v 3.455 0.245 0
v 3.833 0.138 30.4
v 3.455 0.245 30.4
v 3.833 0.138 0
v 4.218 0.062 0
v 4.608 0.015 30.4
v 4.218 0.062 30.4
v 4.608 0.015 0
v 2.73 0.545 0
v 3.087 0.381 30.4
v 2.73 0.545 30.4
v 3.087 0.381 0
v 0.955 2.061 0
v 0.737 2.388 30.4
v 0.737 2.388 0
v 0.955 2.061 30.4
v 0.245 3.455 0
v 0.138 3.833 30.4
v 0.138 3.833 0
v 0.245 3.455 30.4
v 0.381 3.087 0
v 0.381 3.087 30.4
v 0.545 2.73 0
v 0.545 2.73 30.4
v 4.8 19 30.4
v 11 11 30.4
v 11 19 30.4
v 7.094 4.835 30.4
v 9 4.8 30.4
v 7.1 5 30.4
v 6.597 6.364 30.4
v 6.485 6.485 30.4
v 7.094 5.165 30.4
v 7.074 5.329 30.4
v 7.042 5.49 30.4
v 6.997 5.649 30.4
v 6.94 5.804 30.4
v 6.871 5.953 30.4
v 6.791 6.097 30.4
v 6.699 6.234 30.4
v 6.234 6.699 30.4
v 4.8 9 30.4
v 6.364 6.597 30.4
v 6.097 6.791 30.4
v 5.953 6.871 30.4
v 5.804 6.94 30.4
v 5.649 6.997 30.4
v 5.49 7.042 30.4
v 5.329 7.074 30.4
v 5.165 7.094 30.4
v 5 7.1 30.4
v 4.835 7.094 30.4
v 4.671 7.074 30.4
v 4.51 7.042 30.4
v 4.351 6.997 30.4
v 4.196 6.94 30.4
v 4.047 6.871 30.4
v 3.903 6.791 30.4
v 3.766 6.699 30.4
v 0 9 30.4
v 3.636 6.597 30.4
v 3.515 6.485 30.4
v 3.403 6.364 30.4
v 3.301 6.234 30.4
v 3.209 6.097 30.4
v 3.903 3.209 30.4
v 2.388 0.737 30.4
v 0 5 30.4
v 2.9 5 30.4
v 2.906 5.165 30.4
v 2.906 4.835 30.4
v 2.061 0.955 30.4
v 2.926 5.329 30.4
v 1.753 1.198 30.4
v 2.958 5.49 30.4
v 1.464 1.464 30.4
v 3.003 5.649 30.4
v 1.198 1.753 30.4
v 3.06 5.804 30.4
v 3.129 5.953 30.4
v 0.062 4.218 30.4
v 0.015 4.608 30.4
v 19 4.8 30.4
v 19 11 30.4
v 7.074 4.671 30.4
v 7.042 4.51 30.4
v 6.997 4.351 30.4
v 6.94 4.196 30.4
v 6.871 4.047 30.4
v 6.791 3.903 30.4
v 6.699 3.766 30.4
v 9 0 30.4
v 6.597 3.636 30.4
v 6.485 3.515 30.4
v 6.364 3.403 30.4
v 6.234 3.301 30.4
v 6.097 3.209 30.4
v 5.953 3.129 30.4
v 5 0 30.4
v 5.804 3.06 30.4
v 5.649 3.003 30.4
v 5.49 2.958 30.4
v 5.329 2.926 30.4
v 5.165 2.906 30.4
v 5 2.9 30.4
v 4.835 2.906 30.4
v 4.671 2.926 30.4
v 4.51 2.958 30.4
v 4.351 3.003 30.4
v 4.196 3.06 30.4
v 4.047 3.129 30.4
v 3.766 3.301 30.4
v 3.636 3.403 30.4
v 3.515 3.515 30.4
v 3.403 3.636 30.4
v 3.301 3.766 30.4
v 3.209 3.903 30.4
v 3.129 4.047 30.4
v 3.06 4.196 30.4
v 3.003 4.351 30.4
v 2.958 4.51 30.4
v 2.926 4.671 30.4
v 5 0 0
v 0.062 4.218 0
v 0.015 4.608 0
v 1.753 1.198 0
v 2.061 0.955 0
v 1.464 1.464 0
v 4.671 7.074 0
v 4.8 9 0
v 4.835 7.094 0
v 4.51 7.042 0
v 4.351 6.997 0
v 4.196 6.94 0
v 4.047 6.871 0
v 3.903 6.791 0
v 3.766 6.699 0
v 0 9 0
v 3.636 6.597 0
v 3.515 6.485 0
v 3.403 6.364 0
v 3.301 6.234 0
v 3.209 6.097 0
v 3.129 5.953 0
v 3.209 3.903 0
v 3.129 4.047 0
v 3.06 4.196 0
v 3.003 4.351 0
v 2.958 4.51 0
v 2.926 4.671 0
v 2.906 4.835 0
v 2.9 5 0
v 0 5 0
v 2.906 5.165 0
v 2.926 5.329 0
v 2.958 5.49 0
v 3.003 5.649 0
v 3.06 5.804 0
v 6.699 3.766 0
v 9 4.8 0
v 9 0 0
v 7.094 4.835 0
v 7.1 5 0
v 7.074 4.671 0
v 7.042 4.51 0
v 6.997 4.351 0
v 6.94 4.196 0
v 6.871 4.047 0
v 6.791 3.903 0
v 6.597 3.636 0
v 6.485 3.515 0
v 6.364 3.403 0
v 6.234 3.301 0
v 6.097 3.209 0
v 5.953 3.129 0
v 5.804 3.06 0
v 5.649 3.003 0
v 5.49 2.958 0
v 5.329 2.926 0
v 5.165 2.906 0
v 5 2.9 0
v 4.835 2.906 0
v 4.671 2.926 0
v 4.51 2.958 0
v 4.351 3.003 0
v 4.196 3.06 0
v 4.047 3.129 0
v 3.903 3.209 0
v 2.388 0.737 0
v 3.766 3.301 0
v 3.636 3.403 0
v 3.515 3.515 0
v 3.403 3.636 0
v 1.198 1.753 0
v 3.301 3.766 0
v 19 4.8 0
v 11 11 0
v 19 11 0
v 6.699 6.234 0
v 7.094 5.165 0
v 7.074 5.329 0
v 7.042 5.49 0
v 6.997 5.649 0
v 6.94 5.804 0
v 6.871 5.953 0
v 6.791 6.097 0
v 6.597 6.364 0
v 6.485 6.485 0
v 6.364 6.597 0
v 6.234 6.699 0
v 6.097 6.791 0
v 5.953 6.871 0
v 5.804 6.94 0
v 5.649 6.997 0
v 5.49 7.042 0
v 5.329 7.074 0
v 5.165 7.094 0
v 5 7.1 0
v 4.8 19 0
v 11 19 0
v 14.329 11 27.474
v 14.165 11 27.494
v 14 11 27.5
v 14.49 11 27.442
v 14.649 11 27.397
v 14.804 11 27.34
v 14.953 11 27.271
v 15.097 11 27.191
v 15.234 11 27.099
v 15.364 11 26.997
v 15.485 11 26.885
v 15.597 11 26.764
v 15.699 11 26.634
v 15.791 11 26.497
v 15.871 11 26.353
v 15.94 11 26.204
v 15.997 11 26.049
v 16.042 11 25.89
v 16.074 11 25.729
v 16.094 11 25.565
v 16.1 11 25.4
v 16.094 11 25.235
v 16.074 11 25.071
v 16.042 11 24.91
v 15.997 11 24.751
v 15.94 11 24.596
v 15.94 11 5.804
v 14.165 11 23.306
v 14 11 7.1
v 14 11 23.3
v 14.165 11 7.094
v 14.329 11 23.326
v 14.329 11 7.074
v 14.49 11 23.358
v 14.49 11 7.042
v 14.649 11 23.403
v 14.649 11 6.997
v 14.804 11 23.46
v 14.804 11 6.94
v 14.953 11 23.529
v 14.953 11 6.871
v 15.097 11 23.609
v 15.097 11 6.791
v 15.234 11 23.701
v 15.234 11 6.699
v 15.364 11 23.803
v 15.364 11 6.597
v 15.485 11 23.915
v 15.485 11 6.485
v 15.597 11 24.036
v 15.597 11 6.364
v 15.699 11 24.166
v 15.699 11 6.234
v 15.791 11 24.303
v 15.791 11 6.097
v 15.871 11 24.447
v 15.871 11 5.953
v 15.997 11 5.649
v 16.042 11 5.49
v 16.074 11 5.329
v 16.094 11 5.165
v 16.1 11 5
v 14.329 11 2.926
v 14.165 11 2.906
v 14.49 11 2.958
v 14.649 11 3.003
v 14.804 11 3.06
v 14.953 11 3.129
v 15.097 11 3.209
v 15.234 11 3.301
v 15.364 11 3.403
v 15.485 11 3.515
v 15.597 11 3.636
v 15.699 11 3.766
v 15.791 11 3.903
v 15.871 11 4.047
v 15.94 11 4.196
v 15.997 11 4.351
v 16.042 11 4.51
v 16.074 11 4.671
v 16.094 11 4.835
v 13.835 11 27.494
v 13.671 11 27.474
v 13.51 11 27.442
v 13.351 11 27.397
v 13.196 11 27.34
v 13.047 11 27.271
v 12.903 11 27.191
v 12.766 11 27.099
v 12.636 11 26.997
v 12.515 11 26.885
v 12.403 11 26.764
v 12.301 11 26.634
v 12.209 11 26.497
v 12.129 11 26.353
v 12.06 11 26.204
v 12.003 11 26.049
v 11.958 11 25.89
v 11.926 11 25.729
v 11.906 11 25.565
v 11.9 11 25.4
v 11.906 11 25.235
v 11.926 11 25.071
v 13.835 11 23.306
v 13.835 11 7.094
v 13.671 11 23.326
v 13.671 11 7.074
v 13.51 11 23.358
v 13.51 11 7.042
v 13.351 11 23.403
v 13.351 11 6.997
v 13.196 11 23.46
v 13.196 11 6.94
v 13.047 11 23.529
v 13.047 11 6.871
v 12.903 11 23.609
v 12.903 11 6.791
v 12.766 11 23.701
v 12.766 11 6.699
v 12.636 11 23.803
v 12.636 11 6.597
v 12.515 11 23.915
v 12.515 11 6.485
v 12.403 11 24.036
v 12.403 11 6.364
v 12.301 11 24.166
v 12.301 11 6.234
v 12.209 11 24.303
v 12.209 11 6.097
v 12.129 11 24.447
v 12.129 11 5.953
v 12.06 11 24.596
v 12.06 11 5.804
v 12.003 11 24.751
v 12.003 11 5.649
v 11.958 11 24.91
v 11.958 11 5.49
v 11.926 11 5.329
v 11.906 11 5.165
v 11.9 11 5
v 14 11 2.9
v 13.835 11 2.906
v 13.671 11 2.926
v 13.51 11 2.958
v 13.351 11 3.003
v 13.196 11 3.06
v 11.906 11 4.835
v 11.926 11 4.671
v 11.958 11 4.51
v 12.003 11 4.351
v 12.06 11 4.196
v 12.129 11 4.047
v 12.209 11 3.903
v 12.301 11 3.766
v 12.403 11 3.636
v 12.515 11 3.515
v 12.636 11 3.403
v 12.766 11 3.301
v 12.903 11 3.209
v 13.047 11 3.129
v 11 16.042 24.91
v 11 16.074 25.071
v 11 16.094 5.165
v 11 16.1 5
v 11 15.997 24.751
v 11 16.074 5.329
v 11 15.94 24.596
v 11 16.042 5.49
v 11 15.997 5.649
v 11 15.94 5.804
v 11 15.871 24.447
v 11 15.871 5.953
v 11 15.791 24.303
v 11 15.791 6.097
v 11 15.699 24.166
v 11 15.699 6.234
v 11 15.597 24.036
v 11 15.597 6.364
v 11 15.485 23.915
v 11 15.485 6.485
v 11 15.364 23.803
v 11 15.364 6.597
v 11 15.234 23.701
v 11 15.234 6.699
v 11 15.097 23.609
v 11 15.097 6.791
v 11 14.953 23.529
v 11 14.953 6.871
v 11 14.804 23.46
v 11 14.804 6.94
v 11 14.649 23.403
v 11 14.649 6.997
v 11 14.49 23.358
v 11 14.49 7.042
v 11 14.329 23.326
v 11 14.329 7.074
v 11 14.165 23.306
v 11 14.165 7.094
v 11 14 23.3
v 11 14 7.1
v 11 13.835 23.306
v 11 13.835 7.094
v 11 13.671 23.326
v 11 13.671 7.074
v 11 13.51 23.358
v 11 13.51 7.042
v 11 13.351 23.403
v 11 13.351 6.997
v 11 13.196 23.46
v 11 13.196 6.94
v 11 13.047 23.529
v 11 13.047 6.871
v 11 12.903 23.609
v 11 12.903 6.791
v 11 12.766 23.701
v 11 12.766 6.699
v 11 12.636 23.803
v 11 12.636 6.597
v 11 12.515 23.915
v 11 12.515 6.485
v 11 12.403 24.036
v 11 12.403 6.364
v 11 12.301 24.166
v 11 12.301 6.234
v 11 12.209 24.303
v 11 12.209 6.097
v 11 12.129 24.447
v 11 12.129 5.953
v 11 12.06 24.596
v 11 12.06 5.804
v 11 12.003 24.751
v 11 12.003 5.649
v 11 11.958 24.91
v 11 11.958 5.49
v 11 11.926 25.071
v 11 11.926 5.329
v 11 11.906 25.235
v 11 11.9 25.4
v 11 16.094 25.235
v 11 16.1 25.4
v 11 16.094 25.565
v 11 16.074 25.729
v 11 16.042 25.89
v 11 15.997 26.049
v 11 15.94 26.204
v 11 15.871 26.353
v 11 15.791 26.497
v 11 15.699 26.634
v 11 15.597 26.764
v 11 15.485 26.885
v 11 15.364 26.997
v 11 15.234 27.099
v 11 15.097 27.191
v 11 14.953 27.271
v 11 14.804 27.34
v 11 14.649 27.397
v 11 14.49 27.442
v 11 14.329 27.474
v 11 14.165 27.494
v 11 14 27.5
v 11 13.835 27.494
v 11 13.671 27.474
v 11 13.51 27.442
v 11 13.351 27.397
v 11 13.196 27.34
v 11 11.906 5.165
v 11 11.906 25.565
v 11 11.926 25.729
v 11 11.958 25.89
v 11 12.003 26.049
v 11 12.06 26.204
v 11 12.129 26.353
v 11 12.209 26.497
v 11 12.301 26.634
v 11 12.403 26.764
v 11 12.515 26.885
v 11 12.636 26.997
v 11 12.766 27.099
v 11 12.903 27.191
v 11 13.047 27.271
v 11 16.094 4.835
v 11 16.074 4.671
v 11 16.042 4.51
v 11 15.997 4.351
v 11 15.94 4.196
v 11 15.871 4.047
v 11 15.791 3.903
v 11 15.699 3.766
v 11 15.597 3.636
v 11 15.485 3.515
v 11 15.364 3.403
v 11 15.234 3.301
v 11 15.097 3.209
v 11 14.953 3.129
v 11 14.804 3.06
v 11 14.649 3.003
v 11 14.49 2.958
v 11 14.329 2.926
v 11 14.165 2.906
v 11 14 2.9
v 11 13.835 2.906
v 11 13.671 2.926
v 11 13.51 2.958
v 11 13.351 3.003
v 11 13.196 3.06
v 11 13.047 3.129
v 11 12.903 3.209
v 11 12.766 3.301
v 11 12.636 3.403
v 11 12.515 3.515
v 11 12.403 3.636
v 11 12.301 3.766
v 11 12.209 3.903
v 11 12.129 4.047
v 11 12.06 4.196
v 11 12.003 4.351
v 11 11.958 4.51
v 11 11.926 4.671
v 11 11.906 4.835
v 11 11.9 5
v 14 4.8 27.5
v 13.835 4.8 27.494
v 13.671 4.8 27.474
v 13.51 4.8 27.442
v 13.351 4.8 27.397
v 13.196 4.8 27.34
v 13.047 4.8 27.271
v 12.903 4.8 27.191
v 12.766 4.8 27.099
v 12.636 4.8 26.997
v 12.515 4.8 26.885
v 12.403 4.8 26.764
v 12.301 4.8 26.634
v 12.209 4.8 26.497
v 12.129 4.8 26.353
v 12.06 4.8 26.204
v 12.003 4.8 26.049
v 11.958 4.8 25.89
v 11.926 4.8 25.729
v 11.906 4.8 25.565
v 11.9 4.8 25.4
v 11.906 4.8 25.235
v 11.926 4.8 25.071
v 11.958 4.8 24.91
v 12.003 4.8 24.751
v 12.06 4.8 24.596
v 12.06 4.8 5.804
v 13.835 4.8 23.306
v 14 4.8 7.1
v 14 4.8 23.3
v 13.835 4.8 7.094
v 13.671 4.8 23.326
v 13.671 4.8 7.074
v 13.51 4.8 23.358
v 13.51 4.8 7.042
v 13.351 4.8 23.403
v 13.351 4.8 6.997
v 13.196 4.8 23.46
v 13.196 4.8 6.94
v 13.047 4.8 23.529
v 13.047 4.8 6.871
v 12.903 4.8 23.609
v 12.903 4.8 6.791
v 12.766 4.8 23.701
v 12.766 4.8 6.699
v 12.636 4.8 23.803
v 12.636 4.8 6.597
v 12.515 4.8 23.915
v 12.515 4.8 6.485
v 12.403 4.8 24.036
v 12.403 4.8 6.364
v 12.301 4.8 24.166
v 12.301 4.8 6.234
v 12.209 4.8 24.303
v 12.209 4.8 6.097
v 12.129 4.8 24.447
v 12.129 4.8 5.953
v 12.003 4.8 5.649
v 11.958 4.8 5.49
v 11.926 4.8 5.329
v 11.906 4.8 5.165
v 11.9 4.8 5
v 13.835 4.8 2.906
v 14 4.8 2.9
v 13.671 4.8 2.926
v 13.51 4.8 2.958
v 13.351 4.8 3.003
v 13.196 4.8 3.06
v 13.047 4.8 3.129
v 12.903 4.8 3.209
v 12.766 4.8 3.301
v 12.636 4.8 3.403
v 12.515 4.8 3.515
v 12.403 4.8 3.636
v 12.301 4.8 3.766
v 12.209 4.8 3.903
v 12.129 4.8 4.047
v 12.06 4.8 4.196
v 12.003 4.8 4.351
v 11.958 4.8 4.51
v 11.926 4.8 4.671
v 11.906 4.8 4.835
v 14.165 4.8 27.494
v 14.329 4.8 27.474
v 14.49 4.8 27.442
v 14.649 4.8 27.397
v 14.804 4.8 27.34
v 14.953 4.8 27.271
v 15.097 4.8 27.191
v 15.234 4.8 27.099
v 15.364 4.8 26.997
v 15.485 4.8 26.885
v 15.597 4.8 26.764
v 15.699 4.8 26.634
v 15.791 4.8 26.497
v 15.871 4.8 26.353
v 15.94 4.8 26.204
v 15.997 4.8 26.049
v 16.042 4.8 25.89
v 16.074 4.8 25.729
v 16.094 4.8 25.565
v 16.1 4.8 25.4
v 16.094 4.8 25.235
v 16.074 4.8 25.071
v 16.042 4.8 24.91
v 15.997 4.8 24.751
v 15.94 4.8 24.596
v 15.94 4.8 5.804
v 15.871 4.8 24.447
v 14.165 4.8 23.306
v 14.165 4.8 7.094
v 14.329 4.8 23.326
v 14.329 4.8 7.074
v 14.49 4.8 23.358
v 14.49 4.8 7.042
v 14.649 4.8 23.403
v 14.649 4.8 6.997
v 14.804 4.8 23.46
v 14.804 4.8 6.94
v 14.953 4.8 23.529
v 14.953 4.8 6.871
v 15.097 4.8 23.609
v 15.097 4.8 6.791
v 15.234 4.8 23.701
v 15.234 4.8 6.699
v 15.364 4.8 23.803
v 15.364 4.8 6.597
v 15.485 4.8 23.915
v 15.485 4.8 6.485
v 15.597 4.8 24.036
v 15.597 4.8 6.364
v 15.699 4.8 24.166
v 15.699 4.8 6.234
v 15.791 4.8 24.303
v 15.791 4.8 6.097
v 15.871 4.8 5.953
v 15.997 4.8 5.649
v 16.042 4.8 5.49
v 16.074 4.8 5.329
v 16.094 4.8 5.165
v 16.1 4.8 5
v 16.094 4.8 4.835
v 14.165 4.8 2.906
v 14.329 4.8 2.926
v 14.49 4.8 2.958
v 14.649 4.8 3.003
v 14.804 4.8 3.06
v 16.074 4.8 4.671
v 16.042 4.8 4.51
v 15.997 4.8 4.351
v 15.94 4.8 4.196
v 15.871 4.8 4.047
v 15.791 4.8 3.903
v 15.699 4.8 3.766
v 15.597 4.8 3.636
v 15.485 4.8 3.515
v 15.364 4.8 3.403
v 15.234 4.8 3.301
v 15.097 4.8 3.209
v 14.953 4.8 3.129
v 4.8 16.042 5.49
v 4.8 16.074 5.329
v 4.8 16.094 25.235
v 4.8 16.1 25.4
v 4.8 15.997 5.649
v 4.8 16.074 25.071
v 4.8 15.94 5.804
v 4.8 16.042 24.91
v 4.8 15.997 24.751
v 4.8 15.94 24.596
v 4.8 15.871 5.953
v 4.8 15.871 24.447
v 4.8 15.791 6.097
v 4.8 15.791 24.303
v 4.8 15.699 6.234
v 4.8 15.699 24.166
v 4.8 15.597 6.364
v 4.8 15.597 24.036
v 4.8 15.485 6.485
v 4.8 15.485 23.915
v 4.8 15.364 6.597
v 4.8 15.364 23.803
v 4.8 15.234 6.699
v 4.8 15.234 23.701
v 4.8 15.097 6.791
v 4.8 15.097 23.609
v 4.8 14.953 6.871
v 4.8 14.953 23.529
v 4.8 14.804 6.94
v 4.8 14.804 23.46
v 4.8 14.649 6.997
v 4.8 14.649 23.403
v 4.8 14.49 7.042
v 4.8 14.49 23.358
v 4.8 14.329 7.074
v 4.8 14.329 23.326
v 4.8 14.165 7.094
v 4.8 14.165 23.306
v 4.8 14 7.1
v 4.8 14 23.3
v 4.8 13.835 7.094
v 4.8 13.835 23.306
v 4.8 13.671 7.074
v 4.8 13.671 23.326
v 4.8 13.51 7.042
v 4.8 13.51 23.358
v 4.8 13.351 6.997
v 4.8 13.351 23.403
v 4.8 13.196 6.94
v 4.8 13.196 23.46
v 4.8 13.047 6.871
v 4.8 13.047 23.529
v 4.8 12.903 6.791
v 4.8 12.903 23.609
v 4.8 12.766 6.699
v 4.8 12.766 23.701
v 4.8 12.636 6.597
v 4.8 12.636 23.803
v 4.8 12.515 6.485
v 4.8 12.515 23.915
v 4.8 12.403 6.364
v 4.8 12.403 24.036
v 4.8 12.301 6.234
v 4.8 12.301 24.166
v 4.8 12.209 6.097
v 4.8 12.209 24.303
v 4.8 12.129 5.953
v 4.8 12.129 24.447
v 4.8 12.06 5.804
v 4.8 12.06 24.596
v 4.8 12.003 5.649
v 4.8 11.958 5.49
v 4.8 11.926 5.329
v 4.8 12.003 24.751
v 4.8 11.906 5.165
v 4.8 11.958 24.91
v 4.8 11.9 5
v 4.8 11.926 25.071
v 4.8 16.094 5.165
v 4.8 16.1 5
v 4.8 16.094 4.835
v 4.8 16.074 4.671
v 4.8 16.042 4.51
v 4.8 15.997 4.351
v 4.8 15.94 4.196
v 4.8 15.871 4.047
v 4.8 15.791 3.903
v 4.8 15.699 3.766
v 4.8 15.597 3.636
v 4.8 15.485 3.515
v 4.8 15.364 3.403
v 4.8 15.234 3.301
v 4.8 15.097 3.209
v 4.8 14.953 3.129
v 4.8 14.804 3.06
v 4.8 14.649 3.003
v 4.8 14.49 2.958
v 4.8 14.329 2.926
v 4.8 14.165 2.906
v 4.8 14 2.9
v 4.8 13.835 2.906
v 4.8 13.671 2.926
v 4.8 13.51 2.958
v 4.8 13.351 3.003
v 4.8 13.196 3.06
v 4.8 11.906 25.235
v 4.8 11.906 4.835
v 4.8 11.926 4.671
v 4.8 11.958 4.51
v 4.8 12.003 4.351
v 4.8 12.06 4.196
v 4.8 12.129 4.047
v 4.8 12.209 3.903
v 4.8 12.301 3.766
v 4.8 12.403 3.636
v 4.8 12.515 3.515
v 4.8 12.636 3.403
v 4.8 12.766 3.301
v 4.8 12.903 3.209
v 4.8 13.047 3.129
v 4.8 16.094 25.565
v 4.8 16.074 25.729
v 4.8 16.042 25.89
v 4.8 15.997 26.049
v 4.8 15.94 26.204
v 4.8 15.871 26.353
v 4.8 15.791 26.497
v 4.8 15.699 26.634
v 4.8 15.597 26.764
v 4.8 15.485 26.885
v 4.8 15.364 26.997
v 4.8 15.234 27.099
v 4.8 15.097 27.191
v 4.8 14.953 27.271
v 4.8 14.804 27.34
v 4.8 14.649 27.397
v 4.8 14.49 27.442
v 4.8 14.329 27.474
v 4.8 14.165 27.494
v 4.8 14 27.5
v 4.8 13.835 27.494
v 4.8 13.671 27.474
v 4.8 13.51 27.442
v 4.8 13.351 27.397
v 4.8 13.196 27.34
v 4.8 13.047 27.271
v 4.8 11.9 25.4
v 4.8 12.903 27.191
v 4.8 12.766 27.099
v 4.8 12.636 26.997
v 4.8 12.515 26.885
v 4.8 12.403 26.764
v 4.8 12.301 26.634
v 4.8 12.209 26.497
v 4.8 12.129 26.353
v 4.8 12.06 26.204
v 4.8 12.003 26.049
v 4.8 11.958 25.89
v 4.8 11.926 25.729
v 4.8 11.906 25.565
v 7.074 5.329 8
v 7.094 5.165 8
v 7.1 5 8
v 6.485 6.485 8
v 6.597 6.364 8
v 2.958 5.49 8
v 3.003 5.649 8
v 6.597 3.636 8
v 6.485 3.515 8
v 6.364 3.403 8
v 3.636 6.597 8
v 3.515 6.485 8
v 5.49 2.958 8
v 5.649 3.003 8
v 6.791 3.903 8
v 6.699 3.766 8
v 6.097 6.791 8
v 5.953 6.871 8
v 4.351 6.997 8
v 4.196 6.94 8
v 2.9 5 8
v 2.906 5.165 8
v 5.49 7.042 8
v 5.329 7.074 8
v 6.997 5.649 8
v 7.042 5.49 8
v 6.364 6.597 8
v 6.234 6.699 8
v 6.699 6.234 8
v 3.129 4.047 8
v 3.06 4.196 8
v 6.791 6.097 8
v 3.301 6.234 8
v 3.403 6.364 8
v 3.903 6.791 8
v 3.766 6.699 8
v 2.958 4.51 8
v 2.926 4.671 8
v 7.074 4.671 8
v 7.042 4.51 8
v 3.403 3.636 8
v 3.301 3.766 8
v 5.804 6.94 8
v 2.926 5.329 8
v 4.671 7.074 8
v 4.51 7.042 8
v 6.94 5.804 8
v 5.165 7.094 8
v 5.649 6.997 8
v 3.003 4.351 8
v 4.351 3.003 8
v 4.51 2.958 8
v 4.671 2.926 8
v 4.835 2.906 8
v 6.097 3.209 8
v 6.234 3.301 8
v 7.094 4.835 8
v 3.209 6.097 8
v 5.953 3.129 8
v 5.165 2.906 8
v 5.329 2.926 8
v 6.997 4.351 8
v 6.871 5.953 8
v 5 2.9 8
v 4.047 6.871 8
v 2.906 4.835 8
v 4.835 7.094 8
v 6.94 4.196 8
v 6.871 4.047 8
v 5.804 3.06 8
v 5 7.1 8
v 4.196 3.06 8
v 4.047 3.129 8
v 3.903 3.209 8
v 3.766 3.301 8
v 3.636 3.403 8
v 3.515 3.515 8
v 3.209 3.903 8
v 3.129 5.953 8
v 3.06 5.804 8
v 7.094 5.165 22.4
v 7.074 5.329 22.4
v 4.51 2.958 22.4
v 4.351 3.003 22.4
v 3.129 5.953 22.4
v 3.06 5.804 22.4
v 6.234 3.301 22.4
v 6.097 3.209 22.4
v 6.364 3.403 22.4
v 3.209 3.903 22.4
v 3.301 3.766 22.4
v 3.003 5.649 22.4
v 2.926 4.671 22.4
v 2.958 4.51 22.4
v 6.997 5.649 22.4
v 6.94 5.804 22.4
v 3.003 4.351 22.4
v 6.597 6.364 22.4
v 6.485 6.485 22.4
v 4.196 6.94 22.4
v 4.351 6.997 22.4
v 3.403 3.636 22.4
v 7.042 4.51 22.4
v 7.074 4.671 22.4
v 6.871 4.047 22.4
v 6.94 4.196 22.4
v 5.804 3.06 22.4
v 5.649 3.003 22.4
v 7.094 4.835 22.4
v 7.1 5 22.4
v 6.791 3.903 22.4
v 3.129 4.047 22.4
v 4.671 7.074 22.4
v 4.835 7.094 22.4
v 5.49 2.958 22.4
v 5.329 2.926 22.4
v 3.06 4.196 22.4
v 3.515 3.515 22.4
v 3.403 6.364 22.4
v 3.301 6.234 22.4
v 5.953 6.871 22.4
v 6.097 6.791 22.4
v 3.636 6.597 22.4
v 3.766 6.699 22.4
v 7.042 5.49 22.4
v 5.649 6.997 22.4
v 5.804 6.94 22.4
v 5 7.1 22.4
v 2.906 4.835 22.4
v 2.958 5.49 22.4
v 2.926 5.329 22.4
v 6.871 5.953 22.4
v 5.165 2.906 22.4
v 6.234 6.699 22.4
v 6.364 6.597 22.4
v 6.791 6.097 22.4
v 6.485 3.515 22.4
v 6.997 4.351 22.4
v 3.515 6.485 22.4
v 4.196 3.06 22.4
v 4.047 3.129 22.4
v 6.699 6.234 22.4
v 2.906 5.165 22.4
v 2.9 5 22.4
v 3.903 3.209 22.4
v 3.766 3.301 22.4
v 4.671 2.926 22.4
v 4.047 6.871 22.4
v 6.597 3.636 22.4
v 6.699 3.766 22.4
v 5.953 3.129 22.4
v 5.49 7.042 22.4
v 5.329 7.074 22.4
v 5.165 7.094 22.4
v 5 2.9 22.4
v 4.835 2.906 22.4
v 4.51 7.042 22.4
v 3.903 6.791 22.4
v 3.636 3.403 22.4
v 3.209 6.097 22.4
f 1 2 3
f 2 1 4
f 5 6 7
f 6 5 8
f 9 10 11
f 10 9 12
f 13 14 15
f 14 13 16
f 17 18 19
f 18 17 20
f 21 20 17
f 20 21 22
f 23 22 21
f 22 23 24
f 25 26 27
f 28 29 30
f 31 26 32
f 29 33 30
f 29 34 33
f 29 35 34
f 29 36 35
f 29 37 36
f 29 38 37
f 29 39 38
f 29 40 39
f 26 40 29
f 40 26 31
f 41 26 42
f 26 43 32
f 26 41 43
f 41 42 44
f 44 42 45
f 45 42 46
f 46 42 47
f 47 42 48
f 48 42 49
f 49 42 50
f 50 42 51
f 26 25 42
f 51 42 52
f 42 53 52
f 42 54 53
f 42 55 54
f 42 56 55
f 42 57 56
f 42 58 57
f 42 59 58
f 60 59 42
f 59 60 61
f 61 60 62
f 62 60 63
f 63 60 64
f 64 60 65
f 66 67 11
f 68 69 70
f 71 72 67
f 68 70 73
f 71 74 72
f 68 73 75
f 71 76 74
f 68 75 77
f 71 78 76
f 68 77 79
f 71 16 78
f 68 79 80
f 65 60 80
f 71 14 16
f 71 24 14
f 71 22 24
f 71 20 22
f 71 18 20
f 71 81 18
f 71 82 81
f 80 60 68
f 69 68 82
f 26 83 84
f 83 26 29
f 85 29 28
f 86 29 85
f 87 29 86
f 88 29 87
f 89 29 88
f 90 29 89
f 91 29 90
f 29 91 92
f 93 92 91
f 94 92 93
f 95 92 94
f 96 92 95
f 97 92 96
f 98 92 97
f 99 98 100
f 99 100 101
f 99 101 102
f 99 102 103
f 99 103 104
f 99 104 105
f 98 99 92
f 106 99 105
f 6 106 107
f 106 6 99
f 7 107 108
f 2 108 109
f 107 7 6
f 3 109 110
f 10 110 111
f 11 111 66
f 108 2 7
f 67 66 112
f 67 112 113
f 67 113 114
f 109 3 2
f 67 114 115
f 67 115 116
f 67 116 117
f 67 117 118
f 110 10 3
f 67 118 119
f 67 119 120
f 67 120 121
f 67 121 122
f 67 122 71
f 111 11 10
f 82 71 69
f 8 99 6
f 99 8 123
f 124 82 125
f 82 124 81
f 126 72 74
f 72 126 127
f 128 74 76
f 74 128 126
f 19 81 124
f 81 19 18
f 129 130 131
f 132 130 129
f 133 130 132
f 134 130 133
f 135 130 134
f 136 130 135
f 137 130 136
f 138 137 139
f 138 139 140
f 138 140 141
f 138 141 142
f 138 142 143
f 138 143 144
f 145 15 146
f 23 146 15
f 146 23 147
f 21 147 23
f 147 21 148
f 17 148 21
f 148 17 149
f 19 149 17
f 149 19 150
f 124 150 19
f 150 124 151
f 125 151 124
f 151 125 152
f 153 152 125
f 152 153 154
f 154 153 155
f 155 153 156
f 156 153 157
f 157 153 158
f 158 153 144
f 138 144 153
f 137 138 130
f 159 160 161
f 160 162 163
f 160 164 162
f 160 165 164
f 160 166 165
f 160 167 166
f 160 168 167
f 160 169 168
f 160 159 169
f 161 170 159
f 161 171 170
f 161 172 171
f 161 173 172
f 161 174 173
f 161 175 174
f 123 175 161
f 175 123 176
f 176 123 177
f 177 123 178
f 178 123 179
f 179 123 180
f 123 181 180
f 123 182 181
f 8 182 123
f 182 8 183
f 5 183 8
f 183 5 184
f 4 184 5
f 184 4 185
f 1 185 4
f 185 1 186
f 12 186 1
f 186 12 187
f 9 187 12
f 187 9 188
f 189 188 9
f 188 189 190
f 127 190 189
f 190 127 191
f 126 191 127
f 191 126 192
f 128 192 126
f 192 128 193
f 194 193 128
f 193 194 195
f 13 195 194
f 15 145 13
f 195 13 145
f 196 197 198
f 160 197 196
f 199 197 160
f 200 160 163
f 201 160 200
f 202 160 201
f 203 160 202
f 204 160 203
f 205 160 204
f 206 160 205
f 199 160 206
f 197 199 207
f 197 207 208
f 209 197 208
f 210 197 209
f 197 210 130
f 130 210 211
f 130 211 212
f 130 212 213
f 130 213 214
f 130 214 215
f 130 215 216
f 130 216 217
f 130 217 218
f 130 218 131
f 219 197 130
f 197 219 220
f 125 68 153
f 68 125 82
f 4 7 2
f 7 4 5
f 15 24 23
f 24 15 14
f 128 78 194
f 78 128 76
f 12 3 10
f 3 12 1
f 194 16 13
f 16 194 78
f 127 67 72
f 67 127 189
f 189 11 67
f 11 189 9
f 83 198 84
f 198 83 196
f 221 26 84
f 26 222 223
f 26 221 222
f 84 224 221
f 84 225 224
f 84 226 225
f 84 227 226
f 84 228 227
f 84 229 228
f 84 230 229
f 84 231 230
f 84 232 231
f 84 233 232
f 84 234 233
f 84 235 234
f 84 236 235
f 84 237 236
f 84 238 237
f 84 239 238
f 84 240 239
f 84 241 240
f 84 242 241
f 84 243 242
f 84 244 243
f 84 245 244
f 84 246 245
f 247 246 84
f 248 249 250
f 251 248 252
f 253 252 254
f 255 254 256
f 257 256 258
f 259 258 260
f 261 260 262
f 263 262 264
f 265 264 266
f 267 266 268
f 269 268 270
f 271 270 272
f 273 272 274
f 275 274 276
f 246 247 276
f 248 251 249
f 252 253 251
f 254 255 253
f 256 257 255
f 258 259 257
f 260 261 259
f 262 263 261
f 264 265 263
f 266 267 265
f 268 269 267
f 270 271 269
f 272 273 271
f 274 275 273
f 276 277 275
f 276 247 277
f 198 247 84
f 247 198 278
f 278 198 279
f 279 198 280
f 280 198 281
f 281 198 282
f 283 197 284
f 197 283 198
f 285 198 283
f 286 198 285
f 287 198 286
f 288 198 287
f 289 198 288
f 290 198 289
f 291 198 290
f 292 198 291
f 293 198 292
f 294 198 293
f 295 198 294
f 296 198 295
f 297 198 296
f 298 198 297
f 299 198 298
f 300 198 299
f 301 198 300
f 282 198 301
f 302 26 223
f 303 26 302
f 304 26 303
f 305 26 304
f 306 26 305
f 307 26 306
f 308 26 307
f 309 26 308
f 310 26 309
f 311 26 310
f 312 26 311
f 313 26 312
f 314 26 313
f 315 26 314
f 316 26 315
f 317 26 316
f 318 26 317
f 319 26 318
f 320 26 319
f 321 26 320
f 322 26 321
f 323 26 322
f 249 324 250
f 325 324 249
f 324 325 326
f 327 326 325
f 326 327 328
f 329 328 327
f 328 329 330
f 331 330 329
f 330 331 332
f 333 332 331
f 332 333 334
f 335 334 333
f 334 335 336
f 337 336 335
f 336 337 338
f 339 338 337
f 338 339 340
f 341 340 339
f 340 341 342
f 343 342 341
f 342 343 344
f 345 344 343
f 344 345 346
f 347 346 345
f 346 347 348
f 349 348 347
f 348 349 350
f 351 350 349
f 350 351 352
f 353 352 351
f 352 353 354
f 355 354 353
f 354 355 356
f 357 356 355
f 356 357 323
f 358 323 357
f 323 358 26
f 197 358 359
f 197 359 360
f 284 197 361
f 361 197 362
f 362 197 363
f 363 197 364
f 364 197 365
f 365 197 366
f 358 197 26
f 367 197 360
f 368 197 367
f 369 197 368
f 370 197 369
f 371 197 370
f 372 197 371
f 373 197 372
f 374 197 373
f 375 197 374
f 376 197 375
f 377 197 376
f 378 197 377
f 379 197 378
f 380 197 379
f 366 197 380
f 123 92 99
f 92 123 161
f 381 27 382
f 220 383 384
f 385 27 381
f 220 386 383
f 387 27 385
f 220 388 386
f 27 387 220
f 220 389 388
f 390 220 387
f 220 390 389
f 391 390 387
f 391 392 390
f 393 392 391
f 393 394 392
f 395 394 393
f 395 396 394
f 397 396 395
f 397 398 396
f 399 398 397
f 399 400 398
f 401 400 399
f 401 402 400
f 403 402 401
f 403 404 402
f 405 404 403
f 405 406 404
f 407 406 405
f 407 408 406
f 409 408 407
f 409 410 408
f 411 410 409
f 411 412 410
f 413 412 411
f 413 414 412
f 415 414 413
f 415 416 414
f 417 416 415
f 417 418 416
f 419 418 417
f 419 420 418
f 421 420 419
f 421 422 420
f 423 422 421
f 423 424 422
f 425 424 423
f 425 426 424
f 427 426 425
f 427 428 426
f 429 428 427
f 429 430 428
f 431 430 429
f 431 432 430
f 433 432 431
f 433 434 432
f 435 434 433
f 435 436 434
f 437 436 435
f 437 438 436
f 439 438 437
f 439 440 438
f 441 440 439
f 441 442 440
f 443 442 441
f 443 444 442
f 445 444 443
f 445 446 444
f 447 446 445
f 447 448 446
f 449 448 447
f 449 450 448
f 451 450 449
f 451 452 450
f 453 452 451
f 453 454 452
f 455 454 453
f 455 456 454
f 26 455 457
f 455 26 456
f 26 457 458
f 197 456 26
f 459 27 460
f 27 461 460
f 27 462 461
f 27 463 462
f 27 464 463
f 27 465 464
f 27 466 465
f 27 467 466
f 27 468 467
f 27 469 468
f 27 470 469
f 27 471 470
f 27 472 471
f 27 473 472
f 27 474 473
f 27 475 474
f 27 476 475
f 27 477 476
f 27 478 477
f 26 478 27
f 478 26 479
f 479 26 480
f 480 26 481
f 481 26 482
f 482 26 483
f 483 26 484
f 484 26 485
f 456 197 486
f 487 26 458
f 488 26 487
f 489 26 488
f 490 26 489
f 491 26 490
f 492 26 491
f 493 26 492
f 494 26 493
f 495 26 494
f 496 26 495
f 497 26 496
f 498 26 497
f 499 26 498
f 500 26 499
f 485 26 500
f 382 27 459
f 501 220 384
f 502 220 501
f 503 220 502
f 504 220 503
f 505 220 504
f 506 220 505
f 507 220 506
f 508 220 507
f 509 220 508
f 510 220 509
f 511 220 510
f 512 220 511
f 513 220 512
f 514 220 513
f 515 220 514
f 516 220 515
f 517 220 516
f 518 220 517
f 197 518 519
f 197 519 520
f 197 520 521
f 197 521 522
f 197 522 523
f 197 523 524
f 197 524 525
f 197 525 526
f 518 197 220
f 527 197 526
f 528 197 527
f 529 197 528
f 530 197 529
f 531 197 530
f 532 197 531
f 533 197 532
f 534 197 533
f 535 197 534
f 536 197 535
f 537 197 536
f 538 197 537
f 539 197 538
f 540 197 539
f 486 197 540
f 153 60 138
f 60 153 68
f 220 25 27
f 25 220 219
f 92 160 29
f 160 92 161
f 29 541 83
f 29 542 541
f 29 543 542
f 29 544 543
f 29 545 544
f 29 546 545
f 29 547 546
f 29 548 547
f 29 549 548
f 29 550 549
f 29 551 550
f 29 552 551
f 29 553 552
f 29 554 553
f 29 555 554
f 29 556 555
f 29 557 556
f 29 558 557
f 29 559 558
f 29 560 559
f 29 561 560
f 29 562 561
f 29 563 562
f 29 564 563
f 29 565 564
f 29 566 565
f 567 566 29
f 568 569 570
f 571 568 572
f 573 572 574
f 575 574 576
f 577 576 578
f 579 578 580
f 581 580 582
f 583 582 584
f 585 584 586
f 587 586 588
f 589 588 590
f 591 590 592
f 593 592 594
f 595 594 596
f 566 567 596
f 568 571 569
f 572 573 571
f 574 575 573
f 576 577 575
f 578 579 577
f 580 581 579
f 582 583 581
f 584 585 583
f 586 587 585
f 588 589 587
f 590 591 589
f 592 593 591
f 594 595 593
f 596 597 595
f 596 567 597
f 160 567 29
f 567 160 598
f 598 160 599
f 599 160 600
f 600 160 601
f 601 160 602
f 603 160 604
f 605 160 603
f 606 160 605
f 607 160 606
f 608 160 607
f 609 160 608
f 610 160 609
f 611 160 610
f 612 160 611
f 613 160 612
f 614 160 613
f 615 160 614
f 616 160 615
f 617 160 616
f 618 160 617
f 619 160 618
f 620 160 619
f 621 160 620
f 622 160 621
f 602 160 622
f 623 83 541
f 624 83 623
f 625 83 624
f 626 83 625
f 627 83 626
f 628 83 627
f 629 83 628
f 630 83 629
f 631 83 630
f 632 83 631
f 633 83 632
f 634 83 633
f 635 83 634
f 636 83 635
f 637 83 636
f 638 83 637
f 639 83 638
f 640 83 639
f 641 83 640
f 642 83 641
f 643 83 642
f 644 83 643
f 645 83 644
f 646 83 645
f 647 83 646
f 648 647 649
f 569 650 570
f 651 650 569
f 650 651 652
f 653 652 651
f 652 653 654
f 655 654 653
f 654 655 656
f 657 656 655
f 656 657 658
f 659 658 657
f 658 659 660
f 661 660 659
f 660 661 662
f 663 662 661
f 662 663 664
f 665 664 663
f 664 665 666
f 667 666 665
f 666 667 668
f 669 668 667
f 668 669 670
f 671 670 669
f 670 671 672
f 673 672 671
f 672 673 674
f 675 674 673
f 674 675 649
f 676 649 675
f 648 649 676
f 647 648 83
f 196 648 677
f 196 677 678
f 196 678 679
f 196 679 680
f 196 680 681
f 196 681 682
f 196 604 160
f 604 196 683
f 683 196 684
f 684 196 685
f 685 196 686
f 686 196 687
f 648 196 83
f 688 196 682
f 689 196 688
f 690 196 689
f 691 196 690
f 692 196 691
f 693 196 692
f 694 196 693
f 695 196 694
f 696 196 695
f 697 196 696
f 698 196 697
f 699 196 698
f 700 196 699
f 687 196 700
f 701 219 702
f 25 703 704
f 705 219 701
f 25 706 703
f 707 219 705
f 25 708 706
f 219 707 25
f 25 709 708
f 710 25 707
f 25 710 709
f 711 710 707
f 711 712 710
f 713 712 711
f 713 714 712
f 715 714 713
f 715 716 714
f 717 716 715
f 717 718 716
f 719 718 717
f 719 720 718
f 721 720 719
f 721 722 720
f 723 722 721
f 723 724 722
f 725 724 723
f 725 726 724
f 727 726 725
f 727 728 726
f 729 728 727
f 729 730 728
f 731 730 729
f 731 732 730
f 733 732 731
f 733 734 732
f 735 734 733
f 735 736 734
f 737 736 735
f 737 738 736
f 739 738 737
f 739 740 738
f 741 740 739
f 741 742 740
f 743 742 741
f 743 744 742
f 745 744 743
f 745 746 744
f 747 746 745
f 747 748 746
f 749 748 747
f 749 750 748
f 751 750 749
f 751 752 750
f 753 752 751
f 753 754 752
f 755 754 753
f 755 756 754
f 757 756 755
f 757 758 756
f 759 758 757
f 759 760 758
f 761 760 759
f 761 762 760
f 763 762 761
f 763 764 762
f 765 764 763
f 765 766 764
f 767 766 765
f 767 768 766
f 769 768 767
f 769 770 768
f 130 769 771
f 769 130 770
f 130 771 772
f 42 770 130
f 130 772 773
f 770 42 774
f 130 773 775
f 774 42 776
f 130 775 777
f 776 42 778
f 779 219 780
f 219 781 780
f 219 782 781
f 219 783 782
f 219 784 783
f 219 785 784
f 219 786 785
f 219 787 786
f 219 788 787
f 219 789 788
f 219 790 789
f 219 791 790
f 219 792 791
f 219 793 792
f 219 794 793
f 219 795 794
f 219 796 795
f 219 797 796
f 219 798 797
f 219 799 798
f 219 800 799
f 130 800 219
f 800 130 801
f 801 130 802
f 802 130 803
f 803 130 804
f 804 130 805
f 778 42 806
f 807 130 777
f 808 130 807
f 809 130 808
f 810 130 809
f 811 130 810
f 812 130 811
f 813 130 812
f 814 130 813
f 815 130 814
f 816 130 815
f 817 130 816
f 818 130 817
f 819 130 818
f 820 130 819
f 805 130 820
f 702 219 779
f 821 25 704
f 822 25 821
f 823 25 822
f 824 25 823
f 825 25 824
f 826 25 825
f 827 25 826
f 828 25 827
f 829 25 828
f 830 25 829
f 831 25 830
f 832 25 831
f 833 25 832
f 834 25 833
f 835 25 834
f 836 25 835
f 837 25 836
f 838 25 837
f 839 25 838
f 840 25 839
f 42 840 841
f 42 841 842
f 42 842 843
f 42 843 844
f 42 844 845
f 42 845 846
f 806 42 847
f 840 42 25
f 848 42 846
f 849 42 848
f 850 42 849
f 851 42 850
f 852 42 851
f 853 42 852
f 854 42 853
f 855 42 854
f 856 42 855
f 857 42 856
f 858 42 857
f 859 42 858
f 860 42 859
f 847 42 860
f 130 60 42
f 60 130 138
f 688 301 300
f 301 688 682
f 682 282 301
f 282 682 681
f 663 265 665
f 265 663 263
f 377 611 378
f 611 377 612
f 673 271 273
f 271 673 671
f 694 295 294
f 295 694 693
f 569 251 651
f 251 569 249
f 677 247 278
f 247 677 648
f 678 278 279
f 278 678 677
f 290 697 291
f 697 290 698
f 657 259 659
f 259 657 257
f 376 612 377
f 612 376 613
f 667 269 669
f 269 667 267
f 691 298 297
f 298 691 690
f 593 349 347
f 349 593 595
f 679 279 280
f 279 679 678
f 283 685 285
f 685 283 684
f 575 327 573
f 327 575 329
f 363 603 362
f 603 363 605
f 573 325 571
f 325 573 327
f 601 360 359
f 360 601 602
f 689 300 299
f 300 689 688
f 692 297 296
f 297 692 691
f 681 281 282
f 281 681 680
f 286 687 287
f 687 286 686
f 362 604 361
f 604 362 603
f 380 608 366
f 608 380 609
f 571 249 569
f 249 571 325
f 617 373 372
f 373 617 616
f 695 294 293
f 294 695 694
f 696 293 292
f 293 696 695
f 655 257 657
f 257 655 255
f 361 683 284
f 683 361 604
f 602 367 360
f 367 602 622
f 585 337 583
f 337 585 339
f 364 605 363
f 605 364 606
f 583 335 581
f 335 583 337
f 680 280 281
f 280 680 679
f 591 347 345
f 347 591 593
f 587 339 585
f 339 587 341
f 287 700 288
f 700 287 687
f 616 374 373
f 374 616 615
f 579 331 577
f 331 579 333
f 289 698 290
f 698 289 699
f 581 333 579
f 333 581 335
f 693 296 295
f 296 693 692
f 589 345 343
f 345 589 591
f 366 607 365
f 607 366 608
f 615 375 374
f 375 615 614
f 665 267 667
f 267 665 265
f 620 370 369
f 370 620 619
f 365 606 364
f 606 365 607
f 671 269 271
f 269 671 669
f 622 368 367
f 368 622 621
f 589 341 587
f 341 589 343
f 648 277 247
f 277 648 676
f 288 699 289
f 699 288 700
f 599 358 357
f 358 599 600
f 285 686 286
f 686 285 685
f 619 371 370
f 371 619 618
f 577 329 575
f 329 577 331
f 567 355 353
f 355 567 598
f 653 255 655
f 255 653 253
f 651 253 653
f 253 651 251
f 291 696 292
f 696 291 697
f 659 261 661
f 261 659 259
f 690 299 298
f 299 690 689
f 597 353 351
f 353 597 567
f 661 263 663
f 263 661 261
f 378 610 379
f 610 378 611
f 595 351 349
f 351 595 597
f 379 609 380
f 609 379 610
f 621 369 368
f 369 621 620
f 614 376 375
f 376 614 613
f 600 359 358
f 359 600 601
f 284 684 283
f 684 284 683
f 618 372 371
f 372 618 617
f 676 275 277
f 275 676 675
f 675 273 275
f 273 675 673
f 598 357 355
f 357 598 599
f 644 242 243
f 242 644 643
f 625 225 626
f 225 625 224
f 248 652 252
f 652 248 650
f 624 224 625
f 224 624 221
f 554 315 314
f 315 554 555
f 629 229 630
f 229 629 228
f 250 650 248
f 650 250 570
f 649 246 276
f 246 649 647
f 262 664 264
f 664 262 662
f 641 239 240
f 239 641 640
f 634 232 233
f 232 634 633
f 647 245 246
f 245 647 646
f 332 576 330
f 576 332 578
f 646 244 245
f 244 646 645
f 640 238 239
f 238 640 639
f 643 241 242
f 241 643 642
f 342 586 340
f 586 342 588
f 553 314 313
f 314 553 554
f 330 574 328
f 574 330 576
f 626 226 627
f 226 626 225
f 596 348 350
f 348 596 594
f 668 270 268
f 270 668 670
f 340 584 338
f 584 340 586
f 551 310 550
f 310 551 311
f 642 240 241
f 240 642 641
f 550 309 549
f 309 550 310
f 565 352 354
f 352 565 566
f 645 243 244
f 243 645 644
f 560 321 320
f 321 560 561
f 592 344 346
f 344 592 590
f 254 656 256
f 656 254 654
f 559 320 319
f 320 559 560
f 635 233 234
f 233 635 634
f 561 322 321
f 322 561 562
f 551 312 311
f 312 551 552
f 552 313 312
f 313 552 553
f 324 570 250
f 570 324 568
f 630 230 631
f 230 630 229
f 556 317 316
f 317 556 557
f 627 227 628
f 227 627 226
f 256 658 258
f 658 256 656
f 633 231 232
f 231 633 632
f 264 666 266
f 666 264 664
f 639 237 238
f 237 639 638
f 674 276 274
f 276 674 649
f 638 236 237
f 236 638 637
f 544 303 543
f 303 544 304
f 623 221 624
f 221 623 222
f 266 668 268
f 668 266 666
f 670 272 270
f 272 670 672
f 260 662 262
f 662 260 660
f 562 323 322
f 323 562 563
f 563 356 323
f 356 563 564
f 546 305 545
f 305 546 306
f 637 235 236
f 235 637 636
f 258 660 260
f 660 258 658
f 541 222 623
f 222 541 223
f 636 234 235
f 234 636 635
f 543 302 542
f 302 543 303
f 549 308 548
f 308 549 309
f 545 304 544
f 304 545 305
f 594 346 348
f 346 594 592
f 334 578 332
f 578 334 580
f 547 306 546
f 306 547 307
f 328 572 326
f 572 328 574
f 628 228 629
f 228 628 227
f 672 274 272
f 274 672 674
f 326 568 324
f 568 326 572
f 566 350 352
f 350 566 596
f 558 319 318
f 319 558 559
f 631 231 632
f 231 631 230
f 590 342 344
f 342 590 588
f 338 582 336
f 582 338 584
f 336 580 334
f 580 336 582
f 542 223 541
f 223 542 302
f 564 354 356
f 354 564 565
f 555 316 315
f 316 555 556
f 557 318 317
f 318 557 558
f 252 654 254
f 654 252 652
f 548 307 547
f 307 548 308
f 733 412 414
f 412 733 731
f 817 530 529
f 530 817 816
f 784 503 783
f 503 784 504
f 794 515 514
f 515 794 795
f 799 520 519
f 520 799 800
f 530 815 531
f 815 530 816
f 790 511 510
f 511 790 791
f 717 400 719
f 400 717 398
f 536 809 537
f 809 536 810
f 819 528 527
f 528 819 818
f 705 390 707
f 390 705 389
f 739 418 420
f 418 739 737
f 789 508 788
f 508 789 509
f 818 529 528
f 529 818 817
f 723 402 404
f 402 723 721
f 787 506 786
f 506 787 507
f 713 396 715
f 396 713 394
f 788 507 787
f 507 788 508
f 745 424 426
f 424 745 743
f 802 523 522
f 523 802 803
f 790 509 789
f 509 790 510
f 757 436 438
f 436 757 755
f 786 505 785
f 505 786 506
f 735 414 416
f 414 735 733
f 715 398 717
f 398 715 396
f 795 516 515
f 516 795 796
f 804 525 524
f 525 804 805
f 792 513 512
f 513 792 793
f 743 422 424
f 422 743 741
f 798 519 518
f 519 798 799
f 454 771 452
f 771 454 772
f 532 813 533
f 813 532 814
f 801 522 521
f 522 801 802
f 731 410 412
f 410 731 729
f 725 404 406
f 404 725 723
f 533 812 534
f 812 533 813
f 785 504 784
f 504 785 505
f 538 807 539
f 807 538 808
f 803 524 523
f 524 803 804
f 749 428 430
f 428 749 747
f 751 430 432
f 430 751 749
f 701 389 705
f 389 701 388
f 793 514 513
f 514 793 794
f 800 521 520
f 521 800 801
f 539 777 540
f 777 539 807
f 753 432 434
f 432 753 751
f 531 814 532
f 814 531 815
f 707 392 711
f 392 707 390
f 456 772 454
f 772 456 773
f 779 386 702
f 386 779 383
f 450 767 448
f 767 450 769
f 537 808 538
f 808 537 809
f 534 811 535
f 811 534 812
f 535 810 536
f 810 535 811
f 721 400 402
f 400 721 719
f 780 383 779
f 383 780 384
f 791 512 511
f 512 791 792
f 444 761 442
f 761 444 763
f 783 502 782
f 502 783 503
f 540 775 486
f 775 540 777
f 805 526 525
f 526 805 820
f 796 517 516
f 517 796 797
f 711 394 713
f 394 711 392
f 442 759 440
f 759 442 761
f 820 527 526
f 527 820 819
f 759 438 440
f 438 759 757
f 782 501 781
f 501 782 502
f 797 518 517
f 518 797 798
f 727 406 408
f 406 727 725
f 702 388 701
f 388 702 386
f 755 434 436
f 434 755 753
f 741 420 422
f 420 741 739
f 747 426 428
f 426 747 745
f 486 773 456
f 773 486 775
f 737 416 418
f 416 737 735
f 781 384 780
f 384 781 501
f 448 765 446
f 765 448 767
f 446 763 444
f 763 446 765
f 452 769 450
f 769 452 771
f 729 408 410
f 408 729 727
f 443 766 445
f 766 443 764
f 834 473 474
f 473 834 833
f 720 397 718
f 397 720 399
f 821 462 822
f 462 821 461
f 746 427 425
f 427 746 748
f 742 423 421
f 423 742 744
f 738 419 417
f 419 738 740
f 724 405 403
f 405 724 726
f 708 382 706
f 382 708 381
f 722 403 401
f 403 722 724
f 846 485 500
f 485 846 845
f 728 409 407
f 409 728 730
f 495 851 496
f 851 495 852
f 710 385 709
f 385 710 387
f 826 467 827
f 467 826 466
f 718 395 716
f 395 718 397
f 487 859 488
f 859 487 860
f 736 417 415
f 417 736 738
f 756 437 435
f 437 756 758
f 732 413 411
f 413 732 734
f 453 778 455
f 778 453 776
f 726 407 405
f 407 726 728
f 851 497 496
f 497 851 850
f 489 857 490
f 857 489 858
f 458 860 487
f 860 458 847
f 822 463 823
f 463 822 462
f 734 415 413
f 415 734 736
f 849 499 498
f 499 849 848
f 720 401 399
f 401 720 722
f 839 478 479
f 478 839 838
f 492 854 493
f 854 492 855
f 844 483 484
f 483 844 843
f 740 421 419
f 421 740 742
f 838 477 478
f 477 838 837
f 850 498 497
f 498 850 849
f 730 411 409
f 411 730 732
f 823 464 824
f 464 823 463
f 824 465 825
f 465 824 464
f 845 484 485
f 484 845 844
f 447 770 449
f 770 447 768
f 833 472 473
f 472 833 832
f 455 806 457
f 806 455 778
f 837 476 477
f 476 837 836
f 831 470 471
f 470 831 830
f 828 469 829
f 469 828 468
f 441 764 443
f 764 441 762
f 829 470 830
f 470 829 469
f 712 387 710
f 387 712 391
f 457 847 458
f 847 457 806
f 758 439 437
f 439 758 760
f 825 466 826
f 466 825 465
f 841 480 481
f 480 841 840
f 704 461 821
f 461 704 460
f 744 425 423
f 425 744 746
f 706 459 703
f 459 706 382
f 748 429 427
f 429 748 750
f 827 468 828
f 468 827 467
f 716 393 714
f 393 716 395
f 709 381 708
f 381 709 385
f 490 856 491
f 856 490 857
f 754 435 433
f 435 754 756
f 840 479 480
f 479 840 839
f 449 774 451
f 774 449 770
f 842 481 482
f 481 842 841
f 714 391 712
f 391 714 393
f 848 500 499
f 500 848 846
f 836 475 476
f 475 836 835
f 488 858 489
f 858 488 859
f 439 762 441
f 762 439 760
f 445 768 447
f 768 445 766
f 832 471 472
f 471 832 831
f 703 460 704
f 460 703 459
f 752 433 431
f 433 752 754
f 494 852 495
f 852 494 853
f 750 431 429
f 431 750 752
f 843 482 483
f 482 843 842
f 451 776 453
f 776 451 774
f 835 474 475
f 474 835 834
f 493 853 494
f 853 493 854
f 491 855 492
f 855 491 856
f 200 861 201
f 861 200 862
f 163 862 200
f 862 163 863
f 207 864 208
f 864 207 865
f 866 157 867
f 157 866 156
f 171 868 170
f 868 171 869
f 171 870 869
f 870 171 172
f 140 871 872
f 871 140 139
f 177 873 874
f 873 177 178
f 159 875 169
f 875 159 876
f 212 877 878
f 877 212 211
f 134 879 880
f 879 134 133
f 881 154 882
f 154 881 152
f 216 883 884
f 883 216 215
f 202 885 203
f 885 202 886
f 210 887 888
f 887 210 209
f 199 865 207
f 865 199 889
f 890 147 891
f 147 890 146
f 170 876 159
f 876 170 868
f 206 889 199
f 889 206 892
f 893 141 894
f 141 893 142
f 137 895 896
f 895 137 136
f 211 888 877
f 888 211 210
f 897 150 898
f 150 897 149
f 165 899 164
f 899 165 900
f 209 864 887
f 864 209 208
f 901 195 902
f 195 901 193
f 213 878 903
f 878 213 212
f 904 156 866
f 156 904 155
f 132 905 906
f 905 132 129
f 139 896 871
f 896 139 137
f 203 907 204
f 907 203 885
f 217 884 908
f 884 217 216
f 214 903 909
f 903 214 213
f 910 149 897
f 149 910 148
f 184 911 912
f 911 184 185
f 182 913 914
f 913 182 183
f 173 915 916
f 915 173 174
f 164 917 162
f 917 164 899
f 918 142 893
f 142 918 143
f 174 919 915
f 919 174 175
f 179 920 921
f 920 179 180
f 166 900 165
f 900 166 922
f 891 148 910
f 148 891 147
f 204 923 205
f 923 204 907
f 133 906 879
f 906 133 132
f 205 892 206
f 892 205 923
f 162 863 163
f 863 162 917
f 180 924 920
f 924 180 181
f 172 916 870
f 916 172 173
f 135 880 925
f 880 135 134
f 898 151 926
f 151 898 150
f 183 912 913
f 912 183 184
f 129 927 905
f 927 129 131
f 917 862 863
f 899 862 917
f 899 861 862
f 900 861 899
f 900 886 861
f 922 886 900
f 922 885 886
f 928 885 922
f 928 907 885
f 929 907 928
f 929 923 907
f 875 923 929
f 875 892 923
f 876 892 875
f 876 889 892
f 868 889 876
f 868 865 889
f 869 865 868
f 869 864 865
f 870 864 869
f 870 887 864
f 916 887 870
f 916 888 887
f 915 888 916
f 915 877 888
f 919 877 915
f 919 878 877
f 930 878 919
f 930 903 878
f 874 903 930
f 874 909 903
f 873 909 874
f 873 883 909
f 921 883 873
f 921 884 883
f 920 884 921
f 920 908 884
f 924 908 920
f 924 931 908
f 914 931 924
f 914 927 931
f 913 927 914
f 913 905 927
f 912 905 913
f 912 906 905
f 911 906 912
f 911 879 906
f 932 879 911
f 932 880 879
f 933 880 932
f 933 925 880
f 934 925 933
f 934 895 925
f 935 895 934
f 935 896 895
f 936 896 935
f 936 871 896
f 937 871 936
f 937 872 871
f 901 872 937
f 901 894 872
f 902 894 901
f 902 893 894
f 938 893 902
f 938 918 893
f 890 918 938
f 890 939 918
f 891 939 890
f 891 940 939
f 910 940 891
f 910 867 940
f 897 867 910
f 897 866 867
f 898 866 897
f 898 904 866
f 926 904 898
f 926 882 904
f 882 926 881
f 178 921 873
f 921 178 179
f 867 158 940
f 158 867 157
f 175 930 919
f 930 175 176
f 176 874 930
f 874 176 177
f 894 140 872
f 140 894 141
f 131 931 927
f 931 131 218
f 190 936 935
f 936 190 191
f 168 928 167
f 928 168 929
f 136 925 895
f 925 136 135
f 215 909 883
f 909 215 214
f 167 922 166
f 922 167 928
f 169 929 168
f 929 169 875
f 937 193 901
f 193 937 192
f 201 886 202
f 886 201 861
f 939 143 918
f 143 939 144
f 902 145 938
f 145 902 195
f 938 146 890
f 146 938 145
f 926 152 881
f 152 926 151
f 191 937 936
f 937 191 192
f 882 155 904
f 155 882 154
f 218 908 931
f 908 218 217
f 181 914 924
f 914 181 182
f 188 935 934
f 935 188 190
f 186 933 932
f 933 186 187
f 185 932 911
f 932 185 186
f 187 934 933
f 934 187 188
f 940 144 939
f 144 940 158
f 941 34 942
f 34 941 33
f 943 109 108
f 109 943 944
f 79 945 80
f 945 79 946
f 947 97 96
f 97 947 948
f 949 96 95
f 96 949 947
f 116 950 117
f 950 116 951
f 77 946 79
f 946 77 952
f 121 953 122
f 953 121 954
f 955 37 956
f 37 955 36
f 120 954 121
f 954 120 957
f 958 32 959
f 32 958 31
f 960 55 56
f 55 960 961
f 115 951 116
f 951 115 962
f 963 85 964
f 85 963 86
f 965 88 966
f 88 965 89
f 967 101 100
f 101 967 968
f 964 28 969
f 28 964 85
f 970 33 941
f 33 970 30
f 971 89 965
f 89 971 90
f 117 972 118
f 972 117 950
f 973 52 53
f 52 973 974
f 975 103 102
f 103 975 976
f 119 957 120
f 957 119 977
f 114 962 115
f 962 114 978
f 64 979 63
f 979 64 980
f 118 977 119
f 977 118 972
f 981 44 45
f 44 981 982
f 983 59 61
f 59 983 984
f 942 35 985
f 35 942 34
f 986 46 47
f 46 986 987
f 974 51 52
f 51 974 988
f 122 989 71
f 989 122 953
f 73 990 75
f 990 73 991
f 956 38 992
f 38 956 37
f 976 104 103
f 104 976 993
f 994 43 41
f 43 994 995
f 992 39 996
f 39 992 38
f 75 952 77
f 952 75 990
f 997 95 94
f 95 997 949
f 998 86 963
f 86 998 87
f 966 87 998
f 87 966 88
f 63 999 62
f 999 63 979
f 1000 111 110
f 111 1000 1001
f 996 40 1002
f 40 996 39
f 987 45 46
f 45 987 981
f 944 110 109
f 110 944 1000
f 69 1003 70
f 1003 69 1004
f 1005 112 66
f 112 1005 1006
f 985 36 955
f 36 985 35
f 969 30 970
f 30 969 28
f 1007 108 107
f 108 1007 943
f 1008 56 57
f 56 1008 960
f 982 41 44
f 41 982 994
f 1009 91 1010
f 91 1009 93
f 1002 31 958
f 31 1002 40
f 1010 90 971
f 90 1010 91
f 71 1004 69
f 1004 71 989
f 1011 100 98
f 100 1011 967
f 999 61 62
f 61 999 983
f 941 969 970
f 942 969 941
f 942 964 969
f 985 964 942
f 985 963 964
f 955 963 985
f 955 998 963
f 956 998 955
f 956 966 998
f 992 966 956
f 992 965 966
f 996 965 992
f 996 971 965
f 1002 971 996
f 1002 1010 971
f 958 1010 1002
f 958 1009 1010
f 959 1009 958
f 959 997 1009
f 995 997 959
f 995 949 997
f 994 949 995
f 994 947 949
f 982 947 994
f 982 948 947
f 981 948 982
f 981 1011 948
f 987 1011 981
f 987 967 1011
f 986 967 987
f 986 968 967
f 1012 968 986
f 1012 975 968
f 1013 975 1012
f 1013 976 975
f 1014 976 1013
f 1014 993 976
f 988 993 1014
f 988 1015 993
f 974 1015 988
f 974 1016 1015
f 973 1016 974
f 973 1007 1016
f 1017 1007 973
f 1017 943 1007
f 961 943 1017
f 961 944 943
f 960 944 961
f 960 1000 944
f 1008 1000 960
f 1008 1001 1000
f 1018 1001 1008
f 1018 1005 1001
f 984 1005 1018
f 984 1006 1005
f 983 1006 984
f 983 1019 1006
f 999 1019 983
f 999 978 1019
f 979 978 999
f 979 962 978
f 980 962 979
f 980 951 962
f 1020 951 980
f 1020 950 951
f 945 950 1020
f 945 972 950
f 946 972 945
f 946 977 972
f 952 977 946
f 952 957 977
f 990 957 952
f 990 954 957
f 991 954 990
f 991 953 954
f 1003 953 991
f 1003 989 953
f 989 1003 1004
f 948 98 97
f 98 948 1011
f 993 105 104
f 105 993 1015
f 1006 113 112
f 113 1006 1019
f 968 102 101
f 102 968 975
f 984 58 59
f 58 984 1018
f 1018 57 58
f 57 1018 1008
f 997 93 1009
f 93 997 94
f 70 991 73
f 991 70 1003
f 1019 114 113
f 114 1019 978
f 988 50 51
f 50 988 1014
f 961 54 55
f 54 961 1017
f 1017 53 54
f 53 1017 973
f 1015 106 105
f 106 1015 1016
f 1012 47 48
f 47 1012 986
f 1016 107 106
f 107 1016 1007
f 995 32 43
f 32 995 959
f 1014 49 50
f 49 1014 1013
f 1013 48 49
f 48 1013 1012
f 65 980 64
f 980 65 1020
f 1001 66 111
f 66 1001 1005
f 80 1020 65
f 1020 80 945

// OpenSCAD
// file: ../configurations/global.scad
// external size
case_external_x_size = 90;
case_external_y_size = 140;
case_external_z_size = 40;
case_external_panes_thickness = 4.8;

facade_front_round_edges_radius = 5;
facade_throws_margin = 5;

// facade corners
facade_corners_offset_lenght = 9;
facade_corners_main_x_size = 19;
facade_corners_main_y_size = 19;
facade_corners_main_thickness = 11;

facade_fn = 100;


facade_controller_coords = [
    case_external_x_size / 2,
    case_external_y_size / 2 - 30,
];


// Screen frames



// Generics
insert_throw_diameter = 4.2;
insert_throw_length = 6 + 2;


// Controller facade
controller_breadboard_x_size_point = 28;
controller_breadboard_y_size_point = 9;

controller_facade_z_size = 2;
controller_facade_button_throw_margin = 1;

controller_facade_border_rounded_border_1 = 5;
controller_facade_border_rounded_border_2 = 4;

controller_facade_with_border_x_size = 78;
controller_facade_with_border_y_size = 45;

controller_facade_border_throws_margin = 5;
controller_facade_border_fn = 80;


// Cross Button
controller_cross_button_x_y_size = 20;
controller_cross_button_z_size = 4;
controller_cross_button_thickness = 6;
controller_cross_button_round_edges_radius = 1;
controller_cross_button_support_x_y_size = 22;
controller_cross_button_support_z_size = 1;
controller_cross_button_fn = 150;


// A and B Buttons
controller_a_b_button_diameter = 7;
controller_a_b_button_z_size = 4;
controller_a_b_button_support_diameter = 9;
controller_a_b_button_support_z_size = 1;
controller_a_b_button_fn = 80;


// small Buttons
controller_small_button_diameter = 5;
controller_small_button_z_size = 3;
controller_small_button_support_diameter = 7;
controller_small_button_support_z_size = 1;
controller_small_button_fn = 80;

// Directional cross
controller_directional_cross_points_coords = [6, 5];
controller_start_button_points_coords = [14, 3];
controller_select_button_points_coords = [18, 3];
controller_menu_button_points_coords = [14, 7];
controller_option_button_points_coords = [18, 7];
controller_a_button_points_coords = [23, 4];
controller_b_button_points_coords = [27, 6];
controller_bolt_throws_list = [
    [2, 2],
    [2, 8],
    [10, 2],
    [10, 8],
    [27, 2],
    [23, 8],
];
// main file
include <./../configurations/global.scad>


module facadeCornerPiece(
    round_radius = facade_front_round_edges_radius,
    z_size = case_external_z_size - (case_external_panes_thickness * 2),
    main_x_size = facade_corners_main_x_size,
    main_y_size = facade_corners_main_y_size,
    main_thickness = facade_corners_main_thickness,

    x_branch_offset_thickness = case_external_panes_thickness,
    x_branch_offset_lenght = facade_corners_offset_lenght,

    y_branch_offset_thickness = case_external_panes_thickness,
    y_branch_offset_lenght = facade_corners_offset_lenght,

    correction_offset_thickness = 0.0, //
    correction_offset_length = 0.0, //

    throw_diameter = insert_throw_diameter,
    throw_depth = insert_throw_length,
    throw_x_margin = facade_throws_margin,  // applies on both branches
    throw_y_margin = facade_throws_margin,  // applies on both branches
    throw_z_margin = facade_throws_margin,
    $fn = facade_fn
) {

    difference() {
        union() {
            translate([round_radius, round_radius, 0])
                cylinder(h = z_size, r = round_radius, $fn = $fn);

            translate([round_radius, 0,0])
                cube([
                    main_x_size - round_radius,
                    main_thickness,
                    z_size
                ]);

            translate([0, round_radius, 0])
                cube([
                    main_thickness,
                    main_y_size - round_radius,
                    z_size
                ]);
        }



        // x branch throws
        translate([-correction_offset_length, correction_offset_thickness, 0])
            translate([x_branch_offset_lenght, -main_thickness + x_branch_offset_thickness, - z_size / 2])
                cube([
                    main_x_size - round_radius,
                    main_thickness,
                    z_size * 2
                ]);

        // x branch throws
        translate([correction_offset_thickness, -correction_offset_length, 0])
            translate([-main_thickness + y_branch_offset_thickness, y_branch_offset_lenght, - z_size / 2])
                cube([
                    main_thickness,
                    main_y_size - round_radius,
                    z_size * 2
                ]);



        // x branch throws
        translate([x_branch_offset_lenght + throw_x_margin,  x_branch_offset_thickness - 0.1, throw_y_margin])
            rotate([-90,0,0])
                cylinder(h = throw_depth + 0.1, d = throw_diameter, $fn = $fn);

        translate([x_branch_offset_lenght + throw_x_margin, x_branch_offset_thickness - 0.1, z_size - throw_y_margin])
            rotate([-90,0,0])
                cylinder(h = throw_depth + 0.1, d = throw_diameter, $fn = $fn);


        // y branch throws
        translate([y_branch_offset_thickness - 0.1, y_branch_offset_lenght + throw_x_margin, throw_y_margin])
            rotate([0, 90, 0])
                cylinder(h = throw_depth + 0.1, d = throw_diameter, $fn = $fn);

        translate([y_branch_offset_thickness - 0.1, y_branch_offset_lenght + throw_x_margin, z_size - throw_y_margin])
            rotate([0, 90, 0])
                cylinder(h = throw_depth + 0.1, d = throw_diameter, $fn = $fn);


        // z throws
        translate([throw_z_margin, throw_z_margin, -0.1])
            cylinder(h = throw_depth + 0.1, d = throw_diameter, $fn = $fn);

        translate([throw_z_margin, throw_z_margin, z_size - throw_depth])
            cylinder(h = throw_depth + 0.1, d = throw_diameter, $fn = $fn);

    }
}


facadeCornerPiece(
    $fn = 80
);
